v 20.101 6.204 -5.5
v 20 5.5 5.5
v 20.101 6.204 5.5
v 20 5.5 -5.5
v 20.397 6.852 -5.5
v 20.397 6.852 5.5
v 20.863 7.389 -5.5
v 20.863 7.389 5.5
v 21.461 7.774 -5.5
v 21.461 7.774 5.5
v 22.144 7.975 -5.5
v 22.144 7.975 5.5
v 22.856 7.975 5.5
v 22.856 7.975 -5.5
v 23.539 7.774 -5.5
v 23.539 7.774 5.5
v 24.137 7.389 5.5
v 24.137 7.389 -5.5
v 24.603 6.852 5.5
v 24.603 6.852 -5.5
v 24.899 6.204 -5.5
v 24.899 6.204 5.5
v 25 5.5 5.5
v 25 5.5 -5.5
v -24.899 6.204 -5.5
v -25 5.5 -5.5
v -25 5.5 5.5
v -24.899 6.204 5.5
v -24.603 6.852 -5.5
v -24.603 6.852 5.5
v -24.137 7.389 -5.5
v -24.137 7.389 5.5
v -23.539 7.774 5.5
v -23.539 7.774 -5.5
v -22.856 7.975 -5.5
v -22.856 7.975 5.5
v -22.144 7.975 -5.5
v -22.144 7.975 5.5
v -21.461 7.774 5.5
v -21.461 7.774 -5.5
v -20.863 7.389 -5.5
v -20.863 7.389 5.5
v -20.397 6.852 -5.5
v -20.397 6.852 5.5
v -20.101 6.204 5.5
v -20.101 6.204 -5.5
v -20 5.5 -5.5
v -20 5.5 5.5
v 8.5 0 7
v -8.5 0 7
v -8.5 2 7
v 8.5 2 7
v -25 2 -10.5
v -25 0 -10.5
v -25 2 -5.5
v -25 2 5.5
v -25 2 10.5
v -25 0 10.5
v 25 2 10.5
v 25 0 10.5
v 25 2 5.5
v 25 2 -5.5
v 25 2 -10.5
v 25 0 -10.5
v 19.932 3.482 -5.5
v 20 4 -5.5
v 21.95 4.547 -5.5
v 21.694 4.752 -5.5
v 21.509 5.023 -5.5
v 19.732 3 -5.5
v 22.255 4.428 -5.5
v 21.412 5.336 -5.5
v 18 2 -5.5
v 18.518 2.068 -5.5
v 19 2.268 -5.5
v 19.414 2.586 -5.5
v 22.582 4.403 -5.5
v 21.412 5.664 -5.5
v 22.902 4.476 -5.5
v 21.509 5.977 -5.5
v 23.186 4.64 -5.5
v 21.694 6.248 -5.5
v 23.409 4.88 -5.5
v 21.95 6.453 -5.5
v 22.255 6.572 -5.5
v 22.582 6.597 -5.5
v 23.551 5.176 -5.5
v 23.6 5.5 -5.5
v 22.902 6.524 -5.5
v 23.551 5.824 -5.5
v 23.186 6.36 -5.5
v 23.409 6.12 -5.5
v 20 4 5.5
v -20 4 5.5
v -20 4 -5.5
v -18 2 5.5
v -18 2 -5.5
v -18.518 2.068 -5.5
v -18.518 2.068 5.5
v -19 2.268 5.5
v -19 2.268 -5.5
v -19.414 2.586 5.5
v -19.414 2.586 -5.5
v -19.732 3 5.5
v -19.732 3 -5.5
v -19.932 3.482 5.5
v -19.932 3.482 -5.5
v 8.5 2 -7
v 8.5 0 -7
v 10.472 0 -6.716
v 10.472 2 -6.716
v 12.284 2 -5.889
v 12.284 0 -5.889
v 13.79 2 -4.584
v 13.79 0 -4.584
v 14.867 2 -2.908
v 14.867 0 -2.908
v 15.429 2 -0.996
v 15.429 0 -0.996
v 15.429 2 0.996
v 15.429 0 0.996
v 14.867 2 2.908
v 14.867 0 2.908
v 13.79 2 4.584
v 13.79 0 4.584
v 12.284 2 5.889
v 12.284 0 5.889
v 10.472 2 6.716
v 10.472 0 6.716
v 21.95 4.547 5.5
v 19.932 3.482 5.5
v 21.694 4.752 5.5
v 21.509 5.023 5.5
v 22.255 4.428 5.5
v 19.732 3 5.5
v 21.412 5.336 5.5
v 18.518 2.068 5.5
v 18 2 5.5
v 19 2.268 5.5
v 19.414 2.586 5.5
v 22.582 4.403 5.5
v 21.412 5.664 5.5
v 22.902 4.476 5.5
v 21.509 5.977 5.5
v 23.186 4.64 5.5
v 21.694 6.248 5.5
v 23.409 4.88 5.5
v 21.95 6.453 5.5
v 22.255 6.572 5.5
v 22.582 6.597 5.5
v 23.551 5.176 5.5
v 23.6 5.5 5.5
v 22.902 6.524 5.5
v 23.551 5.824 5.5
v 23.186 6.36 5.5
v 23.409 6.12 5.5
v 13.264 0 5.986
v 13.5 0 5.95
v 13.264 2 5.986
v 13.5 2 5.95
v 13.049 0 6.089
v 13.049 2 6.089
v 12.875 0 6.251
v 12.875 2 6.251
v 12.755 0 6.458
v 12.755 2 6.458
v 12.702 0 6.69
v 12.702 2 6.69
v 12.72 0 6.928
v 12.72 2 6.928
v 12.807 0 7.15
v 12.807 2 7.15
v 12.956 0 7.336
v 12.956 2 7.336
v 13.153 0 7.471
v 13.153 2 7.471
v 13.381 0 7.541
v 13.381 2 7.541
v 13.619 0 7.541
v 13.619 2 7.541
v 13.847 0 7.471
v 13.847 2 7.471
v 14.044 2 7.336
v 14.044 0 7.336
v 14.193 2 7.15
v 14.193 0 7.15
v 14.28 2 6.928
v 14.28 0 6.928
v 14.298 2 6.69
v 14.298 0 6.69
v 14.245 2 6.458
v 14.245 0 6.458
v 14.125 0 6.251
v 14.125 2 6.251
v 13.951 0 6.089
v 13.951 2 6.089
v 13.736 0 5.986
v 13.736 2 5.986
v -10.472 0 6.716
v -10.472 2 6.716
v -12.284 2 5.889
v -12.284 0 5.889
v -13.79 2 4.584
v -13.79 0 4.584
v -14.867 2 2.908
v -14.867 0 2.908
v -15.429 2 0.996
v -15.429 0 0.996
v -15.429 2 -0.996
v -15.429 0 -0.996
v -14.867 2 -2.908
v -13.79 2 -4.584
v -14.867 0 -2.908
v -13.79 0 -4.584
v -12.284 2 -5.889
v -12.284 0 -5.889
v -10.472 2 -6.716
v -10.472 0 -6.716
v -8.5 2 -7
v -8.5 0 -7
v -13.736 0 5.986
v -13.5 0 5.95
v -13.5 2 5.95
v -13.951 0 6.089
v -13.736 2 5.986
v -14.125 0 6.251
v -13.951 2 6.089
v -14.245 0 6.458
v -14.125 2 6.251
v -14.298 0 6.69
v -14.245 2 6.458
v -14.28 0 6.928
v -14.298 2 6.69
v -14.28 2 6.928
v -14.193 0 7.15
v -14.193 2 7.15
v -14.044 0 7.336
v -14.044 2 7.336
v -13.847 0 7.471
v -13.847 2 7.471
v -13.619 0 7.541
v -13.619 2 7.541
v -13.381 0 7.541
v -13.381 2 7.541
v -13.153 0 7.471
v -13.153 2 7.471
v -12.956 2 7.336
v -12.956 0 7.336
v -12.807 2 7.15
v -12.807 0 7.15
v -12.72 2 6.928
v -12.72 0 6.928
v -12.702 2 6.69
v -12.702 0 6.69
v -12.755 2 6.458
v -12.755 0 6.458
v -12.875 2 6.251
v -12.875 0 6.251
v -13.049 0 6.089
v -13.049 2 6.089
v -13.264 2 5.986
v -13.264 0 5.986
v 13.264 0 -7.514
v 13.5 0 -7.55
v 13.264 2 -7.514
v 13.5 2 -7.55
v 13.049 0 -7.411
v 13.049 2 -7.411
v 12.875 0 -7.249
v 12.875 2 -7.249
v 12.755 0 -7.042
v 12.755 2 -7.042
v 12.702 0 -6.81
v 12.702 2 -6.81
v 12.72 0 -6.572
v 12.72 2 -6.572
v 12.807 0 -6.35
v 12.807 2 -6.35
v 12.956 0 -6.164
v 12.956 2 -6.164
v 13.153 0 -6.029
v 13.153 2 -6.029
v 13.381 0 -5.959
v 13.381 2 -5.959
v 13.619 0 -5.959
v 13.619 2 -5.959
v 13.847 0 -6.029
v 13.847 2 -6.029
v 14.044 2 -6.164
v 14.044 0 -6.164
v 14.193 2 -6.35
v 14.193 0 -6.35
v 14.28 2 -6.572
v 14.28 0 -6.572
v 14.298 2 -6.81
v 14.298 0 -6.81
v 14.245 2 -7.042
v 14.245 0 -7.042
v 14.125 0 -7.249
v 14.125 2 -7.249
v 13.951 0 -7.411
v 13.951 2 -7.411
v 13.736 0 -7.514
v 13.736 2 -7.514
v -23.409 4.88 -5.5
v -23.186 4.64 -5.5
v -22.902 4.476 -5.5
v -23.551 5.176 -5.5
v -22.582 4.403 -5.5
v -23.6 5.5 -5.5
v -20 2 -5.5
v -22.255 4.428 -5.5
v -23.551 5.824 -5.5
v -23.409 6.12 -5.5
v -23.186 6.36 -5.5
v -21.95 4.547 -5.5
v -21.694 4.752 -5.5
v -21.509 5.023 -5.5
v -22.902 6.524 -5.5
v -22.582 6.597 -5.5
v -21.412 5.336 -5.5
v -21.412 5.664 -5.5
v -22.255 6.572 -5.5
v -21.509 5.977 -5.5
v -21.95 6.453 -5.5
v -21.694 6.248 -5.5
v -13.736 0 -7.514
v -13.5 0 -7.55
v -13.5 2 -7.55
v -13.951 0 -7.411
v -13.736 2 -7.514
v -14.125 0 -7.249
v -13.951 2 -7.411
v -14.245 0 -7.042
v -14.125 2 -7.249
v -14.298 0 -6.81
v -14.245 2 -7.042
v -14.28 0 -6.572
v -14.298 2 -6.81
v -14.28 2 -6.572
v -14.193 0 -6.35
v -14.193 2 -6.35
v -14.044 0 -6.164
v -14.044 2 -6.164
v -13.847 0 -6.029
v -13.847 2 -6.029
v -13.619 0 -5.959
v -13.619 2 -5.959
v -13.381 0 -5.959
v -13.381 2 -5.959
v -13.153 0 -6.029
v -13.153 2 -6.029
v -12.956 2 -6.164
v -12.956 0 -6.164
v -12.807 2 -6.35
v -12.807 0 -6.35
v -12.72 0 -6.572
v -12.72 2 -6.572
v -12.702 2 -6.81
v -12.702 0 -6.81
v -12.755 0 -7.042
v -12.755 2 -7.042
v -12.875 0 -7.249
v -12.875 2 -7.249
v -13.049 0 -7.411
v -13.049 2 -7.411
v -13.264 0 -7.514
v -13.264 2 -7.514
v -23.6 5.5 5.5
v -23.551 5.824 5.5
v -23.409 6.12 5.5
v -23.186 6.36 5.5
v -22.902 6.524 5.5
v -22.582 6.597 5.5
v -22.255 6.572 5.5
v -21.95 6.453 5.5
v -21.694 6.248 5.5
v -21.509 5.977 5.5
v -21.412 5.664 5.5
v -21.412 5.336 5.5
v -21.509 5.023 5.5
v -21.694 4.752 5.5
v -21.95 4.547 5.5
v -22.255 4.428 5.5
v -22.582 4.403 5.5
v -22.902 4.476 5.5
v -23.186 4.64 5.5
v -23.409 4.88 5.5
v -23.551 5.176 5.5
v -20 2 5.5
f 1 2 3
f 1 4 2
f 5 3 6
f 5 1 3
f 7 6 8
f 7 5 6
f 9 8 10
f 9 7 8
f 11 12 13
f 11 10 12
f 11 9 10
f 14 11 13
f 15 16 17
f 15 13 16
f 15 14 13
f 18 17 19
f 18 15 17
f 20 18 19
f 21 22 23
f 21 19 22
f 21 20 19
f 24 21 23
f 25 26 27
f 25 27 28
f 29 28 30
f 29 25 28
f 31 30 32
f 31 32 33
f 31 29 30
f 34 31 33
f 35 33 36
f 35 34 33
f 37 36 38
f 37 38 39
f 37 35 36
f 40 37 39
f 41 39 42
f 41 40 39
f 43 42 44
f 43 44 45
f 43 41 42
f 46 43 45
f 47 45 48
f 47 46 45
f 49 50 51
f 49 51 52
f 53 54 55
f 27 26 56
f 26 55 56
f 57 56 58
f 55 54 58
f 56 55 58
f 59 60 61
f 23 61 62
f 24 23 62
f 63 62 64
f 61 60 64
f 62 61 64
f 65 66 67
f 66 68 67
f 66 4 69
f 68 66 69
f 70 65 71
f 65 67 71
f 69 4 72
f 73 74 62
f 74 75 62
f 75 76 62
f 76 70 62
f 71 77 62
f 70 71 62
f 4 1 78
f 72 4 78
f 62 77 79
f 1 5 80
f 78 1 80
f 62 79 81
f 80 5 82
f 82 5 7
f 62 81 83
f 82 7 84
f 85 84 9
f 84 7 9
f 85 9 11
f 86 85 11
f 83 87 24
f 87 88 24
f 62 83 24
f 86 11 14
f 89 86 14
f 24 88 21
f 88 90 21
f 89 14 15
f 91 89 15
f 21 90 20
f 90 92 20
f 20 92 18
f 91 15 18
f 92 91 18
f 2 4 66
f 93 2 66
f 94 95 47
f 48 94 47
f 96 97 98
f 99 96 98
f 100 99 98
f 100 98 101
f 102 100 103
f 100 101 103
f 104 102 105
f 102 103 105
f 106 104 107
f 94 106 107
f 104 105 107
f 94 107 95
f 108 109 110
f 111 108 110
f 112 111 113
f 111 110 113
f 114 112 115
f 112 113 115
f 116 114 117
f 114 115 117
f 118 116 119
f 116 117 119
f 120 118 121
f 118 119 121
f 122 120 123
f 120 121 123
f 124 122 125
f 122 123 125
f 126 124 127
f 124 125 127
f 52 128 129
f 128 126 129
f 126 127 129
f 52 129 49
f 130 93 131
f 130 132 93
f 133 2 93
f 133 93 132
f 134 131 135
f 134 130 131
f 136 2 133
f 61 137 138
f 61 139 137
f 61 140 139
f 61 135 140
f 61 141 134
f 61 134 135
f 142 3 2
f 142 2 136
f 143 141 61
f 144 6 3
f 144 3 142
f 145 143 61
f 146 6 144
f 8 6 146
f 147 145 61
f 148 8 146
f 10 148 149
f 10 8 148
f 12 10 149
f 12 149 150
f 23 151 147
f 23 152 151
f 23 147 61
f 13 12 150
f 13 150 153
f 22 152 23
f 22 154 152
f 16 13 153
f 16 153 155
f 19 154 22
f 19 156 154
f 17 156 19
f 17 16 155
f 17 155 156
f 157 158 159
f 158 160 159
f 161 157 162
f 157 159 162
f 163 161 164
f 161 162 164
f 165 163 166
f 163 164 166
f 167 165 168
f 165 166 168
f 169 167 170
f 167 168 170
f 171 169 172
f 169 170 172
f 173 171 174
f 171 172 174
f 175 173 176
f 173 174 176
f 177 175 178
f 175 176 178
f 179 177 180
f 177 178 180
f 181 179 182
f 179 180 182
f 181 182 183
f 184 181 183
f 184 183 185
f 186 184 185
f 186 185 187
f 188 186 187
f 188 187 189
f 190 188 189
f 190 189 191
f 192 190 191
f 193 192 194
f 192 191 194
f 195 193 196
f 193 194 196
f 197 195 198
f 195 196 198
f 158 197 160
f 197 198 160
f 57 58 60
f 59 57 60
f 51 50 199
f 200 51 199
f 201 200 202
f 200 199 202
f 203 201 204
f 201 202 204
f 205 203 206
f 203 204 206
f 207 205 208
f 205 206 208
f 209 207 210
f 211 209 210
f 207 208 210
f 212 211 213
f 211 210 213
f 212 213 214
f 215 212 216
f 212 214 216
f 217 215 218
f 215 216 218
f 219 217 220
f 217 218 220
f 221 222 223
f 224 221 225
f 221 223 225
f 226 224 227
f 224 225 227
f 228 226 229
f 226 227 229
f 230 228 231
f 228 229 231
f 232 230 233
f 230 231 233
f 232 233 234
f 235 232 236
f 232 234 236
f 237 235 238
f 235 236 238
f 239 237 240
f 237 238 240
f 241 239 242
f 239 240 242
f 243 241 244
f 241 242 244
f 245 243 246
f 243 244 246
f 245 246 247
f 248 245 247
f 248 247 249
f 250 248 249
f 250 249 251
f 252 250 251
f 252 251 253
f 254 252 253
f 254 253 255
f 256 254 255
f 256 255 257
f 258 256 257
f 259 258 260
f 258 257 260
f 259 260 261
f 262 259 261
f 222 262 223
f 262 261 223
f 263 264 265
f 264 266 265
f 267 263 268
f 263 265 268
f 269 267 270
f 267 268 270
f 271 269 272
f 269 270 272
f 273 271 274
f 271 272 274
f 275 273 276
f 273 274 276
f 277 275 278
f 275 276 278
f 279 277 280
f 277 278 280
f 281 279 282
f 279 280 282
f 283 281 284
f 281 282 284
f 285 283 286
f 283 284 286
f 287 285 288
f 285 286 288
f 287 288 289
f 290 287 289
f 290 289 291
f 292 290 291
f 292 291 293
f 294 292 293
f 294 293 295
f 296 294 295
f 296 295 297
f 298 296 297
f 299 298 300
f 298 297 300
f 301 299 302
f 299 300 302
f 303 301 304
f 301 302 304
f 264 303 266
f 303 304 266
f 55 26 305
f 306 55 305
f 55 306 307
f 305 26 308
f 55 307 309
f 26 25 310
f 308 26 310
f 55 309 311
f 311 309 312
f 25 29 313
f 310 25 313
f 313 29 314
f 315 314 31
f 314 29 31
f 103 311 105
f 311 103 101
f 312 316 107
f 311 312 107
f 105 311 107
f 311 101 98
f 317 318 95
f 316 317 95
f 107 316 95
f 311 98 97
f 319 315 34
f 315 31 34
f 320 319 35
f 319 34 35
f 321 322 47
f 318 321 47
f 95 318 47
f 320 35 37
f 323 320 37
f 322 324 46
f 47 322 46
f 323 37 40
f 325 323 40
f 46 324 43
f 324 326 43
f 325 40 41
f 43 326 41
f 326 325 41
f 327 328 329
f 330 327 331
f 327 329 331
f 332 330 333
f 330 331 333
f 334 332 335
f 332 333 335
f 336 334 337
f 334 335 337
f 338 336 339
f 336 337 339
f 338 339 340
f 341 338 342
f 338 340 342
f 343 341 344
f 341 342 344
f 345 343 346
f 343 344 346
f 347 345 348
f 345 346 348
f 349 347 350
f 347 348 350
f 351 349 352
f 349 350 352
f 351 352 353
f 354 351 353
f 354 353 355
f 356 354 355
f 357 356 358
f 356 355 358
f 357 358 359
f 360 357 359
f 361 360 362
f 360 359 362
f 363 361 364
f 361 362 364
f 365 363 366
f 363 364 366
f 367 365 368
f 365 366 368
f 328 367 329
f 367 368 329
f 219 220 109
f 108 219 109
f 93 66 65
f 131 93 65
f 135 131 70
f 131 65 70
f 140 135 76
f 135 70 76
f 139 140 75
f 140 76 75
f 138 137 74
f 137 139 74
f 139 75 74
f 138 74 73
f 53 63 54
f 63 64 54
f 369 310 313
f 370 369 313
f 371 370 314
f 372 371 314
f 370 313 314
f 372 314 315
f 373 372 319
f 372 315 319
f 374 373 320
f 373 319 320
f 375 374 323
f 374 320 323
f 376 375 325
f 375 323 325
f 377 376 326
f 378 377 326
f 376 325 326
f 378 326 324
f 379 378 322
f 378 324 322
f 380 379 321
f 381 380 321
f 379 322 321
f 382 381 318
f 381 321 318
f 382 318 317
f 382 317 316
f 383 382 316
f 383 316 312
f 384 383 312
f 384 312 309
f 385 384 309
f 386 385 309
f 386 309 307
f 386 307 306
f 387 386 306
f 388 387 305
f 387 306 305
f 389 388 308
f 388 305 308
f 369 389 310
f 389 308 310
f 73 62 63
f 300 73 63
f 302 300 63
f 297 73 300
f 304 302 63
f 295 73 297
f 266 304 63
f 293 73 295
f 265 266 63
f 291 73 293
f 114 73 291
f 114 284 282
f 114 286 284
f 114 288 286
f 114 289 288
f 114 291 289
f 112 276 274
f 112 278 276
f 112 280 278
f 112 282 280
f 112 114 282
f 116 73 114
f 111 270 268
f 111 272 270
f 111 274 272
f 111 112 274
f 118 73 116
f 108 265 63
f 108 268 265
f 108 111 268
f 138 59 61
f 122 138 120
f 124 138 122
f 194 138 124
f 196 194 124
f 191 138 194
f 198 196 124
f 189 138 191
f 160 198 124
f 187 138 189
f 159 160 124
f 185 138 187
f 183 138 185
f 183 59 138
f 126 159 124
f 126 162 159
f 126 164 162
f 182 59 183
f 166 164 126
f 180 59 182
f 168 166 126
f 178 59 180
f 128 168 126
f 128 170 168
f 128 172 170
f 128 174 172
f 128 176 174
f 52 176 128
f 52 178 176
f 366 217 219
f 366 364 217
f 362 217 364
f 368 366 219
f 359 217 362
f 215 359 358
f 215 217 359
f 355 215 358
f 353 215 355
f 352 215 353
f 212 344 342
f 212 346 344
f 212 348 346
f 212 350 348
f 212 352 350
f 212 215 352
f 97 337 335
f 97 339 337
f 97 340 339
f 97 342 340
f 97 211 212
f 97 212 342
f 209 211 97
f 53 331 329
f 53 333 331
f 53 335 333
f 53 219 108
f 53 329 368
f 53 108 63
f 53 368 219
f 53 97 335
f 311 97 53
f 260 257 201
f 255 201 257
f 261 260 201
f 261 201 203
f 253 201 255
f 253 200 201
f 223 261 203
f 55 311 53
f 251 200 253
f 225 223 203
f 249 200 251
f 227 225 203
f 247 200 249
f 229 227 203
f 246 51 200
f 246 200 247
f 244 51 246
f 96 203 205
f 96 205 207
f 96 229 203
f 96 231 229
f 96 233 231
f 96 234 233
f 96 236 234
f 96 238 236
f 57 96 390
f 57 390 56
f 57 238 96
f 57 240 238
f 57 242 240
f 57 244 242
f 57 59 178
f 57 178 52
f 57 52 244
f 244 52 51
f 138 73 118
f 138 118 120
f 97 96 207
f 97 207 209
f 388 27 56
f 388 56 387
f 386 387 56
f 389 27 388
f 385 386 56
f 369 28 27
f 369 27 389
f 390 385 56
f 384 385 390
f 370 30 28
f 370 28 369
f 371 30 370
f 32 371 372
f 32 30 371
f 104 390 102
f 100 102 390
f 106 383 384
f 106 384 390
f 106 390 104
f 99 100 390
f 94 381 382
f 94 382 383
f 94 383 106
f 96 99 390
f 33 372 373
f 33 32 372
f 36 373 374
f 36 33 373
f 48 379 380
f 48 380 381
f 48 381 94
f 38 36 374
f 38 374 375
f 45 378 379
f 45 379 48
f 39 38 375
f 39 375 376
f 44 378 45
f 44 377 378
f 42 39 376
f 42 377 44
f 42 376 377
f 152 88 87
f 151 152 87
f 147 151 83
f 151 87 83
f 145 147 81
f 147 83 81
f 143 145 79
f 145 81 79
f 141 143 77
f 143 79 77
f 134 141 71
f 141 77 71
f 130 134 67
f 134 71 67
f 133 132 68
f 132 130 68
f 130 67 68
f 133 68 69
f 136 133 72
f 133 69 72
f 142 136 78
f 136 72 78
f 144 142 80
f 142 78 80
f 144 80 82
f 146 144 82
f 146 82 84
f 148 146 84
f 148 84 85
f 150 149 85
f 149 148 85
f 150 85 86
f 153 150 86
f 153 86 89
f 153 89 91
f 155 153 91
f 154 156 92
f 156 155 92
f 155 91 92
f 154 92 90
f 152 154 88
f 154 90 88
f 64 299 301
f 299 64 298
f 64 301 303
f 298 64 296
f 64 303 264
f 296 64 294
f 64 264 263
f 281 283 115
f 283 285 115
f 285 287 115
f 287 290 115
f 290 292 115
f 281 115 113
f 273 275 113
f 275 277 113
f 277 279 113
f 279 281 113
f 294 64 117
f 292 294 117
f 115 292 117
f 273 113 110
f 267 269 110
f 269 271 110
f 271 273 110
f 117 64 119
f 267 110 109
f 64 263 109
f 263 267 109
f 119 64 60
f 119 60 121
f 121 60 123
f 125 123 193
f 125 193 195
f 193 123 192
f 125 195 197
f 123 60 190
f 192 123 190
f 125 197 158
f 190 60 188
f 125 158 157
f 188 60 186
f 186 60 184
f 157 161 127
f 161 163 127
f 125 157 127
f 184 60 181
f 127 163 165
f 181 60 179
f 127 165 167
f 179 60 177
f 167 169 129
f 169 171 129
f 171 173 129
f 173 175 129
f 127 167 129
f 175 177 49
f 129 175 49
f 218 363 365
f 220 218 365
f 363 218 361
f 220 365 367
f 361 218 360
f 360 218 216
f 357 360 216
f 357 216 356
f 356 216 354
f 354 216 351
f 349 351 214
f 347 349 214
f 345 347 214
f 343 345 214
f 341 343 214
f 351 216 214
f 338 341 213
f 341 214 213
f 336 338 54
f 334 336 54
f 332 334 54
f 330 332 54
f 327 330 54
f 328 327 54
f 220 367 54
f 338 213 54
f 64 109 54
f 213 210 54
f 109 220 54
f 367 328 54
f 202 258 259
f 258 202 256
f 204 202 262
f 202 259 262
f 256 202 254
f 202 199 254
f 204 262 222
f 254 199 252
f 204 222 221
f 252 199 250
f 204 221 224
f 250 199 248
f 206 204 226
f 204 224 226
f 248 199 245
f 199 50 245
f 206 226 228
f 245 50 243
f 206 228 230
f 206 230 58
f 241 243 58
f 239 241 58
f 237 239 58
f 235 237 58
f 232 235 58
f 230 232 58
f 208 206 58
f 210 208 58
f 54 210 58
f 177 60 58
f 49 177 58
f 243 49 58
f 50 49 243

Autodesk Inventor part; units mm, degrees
ref_plane "YZ Plane" through (0, 0, 0) normal (1, 0, 0) x (0, 1, 0)
ref_plane "XZ Plane" through (0, 0, 0) normal (0, 1, 0) x (-1, 0, 0)
ref_plane "XY Plane" through (0, 0, 0) normal (0, 0, 1) x (1, 0, 0)
sketch "スケッチ1" plane through (0, 0, 0) normal (0, 1, 0) x (-1, 0, 0)
  line L0 (0, 6.75) -> (-13.5, 6.75) construction
  line L1 (-13.5, 6.75) -> (-13.5, -6.75) construction
  line L2 (-13.5, -6.75) -> (0, -6.75) construction
  line L3 (0, -6.75) -> (0, 6.75) construction
  circle A0 centre (-8.5, 0) radius 7
  line L4 (0, 10.5) -> (-25, 10.5)
  line L5 (-25, 10.5) -> (-25, -10.5)
  line L6 (-25, -10.5) -> (0, -10.5)
  line L7 (0, -10.5) -> (0, 10.5)
  line L8 (-25, -6.5) -> (-25, 10.5)
  line L9 (0, 7) -> (-8.5, 7)
  line L10 (0, -7) -> (-8.5, -7)
  point P0 (0, 0)
  point P1 (0, 0)
  dimension "d0" = 13.5
  dimension "d1" = 13.5
  dimension "d2" = 8.5
  dimension "d3" = 14
  dimension "d4" = 21
  dimension "d5" = 25
extrude "押し出し1" add sketch "スケッチ1" along normal blind 2 contours A0 L10 L7 L6 L5 L4 L9
hole "穴1" at (13.5, 0, -6.75) at (13.5, 0, 6.75) direction (0, 1, 0) diameter 1.6 end through all clearance for "Flat Head Machine Screw (82)" size "#0" standard "Ansi Unified Screw Threads"
sketch "スケッチ3" plane through (0, 0, 0) normal (0, 0, 1) x (1, 0, 0)
  line L0 (25, 0) -> (0, 0) projected
  line L1 (0, 0) -> (0, 2) projected
  line L2 (25, 2) -> (0, 2) projected
  line L3 (25, 0) -> (25, 2) projected
  line L4 (25, 2) -> (25, 9)
  line L5 (25, 9) -> (20, 9)
  line L6 (20, 9) -> (20, 2)
  circle A0 centre (22.5, 5.5) radius 1.1
  circle A1 centre (22.5, 5.5) radius 3.5 construction
  arc A2 (25, 5.5) -> (20, 5.5) centre (22.5, 5.5) ccw
  arc A3 (20, 5.5) -> (25, 5.5) centre (22.5, 5.5) ccw construction
  point P0 (0, 0)
  point P1 (22.5, 9)
  dimension "d27" = 7
  dimension "d29" = 2.2
  dimension "d30" = 5
extrude "押し出し3" add sketch "スケッチ3" along normal mid plane 11 contours L2 L6 A2 L4
fillet "フィレット2" radius 2 1 edges at (20, 2, 0)
mirror "ミラー2" about plane through (0, 0, 0) normal (1, 0, 0) of "押し出し1", "穴1", "押し出し3", "フィレット2"
properties part number "Ultrasonic_holderV2"
